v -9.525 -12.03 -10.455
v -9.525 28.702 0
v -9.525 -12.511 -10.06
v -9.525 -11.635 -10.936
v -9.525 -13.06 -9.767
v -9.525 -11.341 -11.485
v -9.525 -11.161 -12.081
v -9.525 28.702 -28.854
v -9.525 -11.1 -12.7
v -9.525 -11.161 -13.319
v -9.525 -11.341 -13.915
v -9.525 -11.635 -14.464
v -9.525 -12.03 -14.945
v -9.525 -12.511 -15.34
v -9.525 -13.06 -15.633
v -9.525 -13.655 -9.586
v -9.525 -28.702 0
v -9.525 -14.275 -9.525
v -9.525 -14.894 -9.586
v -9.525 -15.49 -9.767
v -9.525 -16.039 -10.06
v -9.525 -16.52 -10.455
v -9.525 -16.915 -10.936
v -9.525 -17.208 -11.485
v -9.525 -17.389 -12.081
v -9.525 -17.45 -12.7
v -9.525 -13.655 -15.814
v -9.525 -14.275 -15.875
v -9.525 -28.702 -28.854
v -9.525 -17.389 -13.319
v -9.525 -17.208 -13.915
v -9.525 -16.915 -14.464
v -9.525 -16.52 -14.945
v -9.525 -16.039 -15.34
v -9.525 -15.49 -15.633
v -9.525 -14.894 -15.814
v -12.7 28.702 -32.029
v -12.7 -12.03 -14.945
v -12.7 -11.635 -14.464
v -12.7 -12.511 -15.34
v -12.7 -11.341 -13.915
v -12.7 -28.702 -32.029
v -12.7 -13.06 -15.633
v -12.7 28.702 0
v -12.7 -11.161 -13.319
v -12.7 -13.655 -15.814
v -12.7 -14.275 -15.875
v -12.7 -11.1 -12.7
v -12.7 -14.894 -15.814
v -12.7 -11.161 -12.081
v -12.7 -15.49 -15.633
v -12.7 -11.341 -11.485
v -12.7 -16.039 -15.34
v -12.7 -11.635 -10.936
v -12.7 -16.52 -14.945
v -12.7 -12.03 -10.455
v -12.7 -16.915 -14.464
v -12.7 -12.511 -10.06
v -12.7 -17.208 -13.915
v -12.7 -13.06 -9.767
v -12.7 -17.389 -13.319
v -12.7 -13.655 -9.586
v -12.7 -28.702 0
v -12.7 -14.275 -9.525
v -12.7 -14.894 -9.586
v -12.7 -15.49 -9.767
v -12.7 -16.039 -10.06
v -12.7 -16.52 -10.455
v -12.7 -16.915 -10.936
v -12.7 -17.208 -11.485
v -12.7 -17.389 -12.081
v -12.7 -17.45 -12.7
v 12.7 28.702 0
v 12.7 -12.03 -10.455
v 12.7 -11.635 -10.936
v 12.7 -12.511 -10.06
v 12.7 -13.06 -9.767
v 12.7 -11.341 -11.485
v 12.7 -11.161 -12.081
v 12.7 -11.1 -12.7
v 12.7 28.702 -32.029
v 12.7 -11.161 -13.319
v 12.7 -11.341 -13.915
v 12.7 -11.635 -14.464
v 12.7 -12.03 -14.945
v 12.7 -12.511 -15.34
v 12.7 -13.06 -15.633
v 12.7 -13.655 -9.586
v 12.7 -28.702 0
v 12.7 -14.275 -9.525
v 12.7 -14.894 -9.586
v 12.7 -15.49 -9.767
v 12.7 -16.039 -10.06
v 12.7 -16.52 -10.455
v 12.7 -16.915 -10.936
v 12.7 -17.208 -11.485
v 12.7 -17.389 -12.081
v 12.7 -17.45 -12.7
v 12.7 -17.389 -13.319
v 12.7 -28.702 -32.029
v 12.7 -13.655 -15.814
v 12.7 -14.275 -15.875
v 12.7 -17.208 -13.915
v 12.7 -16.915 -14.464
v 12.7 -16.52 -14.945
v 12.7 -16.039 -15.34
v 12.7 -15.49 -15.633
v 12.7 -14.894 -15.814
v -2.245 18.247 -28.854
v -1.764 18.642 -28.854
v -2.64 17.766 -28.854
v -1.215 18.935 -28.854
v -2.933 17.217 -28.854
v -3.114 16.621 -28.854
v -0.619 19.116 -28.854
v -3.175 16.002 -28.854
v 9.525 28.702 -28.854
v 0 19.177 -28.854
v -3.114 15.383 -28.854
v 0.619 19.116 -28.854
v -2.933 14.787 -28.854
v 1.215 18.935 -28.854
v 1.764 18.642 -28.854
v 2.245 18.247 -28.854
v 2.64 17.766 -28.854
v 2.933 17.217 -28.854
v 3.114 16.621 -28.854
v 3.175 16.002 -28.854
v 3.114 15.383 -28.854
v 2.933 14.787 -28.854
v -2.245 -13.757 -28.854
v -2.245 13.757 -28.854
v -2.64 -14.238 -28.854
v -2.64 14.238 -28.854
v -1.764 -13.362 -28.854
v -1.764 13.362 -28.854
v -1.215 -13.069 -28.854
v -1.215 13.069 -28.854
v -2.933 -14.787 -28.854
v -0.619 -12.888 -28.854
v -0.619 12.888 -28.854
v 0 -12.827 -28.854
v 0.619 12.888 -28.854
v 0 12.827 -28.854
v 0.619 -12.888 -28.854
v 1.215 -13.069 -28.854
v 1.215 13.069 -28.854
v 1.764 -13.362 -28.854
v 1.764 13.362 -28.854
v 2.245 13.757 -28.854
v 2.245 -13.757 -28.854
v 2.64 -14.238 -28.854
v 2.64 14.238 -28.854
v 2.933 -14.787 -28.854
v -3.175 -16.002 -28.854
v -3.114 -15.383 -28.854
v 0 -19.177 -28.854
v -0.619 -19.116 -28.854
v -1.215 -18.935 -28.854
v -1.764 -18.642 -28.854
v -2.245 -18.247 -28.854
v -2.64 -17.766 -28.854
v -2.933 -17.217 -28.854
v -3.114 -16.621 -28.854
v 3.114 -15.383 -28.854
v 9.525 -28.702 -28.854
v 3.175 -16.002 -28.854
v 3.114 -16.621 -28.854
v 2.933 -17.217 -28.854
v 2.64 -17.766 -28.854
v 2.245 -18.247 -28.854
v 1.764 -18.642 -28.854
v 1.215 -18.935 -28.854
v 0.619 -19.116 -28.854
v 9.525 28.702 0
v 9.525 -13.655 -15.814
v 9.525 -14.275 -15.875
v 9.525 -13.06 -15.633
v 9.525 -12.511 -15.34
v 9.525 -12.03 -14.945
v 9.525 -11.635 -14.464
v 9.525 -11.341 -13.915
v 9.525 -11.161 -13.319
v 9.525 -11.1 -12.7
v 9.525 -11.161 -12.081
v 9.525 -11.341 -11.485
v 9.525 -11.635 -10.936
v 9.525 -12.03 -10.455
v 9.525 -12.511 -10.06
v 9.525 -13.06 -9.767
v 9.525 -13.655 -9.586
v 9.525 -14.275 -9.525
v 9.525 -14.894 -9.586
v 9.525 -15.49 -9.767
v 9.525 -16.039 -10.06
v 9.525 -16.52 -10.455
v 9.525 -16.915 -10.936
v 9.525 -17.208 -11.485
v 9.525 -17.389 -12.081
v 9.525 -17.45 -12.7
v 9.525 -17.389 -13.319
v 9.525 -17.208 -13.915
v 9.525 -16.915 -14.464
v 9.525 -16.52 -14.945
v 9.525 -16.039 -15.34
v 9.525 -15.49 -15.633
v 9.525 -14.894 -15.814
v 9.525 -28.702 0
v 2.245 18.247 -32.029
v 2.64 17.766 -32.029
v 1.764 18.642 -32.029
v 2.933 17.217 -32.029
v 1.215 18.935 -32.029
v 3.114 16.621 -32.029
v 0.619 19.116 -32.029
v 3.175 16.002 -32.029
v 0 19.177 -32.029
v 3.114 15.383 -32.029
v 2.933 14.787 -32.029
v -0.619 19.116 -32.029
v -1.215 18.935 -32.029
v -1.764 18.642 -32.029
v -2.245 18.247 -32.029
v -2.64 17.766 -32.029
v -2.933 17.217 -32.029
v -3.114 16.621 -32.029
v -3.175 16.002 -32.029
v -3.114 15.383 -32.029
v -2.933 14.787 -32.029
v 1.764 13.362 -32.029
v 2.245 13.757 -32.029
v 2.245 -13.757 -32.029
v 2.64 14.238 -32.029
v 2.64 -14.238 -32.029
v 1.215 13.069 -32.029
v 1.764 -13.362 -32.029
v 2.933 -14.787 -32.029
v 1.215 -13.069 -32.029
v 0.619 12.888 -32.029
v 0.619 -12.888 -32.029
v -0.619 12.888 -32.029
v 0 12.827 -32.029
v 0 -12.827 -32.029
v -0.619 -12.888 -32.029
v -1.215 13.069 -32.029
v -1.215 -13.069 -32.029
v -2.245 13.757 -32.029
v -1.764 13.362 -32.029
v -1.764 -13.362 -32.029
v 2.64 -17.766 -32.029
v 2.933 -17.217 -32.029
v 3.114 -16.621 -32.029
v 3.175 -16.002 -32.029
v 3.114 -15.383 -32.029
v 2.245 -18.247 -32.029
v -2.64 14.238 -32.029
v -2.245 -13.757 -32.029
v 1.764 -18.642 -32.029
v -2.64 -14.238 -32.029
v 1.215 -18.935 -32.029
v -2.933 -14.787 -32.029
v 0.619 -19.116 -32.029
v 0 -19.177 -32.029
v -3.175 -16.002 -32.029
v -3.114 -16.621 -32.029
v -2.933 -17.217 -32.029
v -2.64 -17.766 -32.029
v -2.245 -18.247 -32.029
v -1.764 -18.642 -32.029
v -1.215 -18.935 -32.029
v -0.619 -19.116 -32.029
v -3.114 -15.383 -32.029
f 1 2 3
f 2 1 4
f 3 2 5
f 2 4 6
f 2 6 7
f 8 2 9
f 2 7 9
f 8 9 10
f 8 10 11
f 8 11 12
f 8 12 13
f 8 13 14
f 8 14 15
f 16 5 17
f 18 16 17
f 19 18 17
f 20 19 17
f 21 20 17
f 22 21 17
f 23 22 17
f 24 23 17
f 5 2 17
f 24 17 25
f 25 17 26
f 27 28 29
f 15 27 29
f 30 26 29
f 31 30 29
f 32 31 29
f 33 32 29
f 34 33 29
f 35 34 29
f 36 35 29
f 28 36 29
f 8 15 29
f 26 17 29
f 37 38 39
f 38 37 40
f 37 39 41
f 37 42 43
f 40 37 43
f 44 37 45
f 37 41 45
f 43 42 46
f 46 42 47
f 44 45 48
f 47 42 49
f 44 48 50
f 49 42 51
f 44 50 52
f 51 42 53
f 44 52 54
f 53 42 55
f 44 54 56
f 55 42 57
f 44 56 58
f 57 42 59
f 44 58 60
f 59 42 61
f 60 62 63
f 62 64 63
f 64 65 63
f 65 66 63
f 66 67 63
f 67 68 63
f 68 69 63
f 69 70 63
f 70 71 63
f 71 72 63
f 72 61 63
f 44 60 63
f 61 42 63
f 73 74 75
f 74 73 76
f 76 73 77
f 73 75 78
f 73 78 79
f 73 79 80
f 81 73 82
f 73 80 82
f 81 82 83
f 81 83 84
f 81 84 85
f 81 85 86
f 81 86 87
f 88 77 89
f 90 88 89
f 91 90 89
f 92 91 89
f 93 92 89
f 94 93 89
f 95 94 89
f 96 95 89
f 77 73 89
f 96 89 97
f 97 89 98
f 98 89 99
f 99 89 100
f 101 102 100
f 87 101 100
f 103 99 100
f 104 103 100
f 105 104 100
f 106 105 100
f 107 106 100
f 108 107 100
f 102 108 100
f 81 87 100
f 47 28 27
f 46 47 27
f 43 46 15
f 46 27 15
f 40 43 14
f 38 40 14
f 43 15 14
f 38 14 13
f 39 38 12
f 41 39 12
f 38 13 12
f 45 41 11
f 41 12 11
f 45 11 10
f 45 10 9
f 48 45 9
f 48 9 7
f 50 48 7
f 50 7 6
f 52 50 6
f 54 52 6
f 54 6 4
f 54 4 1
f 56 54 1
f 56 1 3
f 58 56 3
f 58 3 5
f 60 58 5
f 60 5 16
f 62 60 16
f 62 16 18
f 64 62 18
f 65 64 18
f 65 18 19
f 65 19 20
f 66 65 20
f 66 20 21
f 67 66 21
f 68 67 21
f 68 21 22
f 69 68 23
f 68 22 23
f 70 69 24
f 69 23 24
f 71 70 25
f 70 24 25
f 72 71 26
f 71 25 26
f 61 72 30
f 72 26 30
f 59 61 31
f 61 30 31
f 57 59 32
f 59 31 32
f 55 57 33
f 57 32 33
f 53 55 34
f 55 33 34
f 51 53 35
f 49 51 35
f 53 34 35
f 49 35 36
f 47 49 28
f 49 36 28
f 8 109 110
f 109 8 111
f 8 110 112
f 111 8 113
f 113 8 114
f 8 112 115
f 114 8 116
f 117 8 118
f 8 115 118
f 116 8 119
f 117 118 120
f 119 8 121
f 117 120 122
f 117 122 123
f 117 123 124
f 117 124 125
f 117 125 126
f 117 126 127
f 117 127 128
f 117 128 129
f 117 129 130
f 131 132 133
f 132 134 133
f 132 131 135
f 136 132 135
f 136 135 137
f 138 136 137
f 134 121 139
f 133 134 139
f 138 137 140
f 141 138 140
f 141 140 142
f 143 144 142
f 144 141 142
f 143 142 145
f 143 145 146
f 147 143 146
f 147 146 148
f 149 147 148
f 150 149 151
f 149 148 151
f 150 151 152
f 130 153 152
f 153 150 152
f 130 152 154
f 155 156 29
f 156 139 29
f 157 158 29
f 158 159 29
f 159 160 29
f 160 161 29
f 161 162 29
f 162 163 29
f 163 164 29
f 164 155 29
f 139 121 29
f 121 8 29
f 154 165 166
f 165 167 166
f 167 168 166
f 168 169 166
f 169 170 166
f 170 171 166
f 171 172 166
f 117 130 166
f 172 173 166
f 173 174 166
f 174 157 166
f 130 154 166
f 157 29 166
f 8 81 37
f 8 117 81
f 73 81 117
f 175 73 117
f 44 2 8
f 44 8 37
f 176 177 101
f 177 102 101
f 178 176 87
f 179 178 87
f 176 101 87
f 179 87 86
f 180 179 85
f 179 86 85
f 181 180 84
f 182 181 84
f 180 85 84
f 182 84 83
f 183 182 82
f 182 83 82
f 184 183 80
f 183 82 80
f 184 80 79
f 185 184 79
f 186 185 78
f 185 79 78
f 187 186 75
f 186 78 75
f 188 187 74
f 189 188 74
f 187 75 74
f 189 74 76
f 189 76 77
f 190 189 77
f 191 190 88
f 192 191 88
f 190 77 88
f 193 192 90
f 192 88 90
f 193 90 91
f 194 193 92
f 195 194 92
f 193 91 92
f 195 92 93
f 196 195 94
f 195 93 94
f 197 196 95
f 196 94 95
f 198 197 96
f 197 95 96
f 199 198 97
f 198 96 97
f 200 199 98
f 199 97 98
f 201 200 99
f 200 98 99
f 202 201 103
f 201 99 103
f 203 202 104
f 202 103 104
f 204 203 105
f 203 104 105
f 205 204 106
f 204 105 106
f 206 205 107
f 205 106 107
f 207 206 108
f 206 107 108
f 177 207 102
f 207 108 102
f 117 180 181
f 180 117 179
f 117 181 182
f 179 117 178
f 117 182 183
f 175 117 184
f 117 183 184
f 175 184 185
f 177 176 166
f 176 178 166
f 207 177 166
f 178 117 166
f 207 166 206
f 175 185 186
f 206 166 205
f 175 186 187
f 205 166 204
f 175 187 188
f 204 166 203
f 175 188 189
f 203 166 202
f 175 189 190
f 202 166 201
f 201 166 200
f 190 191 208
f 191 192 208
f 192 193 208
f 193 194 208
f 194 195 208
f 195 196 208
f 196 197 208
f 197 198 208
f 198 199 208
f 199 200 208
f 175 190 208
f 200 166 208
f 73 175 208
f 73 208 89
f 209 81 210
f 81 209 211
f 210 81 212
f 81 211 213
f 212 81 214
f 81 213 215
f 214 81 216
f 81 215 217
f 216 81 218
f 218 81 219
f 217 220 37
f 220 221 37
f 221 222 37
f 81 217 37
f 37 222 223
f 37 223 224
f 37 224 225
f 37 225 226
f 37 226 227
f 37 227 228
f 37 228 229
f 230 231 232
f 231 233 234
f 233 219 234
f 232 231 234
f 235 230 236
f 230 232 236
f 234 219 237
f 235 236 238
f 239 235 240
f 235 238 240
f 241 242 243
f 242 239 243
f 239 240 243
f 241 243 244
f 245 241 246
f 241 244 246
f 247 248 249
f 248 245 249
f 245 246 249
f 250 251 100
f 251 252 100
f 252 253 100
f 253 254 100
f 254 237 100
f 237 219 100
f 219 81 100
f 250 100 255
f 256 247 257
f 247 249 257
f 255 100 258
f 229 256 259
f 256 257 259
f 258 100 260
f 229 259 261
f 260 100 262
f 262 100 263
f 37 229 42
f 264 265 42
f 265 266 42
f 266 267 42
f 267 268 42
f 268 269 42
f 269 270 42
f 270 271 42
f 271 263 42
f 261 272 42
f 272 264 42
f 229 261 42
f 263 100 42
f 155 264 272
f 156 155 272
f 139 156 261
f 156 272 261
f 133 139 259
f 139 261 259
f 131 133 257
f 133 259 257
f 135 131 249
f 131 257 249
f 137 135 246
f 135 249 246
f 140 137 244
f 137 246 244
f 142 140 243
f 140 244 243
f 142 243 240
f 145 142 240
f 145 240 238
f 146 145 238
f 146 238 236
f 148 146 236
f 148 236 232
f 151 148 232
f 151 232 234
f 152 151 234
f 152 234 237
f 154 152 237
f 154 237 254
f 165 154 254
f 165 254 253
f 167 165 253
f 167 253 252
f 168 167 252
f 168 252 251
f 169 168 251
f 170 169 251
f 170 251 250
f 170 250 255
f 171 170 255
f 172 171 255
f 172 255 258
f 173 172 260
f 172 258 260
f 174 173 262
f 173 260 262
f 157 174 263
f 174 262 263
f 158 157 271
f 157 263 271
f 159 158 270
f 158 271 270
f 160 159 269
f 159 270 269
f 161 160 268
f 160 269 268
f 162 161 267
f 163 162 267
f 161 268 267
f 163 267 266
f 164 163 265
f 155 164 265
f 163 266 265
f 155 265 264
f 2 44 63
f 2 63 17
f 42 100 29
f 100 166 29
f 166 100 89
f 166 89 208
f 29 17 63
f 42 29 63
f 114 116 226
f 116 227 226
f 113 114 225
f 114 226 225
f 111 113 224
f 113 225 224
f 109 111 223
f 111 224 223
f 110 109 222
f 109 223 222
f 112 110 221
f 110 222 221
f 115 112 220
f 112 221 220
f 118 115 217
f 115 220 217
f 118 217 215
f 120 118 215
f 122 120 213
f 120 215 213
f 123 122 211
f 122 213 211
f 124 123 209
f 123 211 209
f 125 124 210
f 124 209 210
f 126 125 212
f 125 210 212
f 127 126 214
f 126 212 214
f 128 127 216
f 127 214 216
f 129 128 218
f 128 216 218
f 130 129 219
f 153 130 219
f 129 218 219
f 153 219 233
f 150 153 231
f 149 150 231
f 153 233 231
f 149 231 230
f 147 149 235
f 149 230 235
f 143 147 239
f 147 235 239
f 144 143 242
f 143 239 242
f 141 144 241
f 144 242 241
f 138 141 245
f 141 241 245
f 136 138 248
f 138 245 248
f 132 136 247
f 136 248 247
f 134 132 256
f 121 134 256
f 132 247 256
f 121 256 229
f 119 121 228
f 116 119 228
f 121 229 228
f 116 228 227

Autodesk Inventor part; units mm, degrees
ref_plane "YZ Plane" through (0, 0, 0) normal (1, 0, 0) x (0, 1, 0)
ref_plane "XZ Plane" through (0, 0, 0) normal (0, 1, 0) x (-1, 0, 0)
ref_plane "XY Plane" through (0, 0, 0) normal (0, 0, 1) x (1, 0, 0)
sketch "Sketch1" plane through (0, 0, 0) normal (0, 1, 0) x (-1, 0, 0)
  line L0 (9.525, 0) -> (9.525, -28.8544)
  line L1 (9.525, -28.8544) -> (-9.525, -28.8544)
  line L2 (-9.525, -28.8544) -> (-9.525, 0)
  line L3 (-9.525, 0) -> (-12.7, 0)
  line L4 (-12.7, 0) -> (-12.7, -32.0294)
  line L5 (-12.7, -32.0294) -> (12.7, -32.0294)
  line L6 (12.7, -32.0294) -> (12.7, 0)
  line L7 (12.7, 0) -> (9.525, 0)
  line L8 (0, -38.4353) -> (0, 6.4059) projected
  line L9 (-17.78, 0) -> (17.78, 0) projected
  point P0 (0, 0)
  dimension "d0" = 3.175
  dimension "d1" = 19.05
  dimension "d2" = 28.8544
  dimension "d3" = 3.175
extrude "Extrusion1" add sketch "Sketch1" along normal mid plane 57.404 contours L7 L6 L5 L8 L1 L0 | L8 L5 L4 L3 L2 L1
sketch "Sketch2" plane through (12.7, 28.702, -32.0294) normal (0, 0, -1) x (-1, 0, 0)
  line L0 (25.4, -57.404) -> (25.4, 0) projected
  line L1 (0, 0) -> (25.4, 0) projected
  line L2 (0, -57.404) -> (0, 0) projected
  line L3 (25.4, -57.404) -> (0, -57.404) projected
  line L4 (12.7, -68.8848) -> (12.7, 11.4808) projected
  line L5 (-5.08, -28.702) -> (30.48, -28.702) projected
  circle A0 centre (12.7, -12.7) radius 3.175
  circle A1 centre (12.7, -44.704) radius 3.175
  point P0 (12.7, -28.702)
  dimension "d6" = 6.35
  dimension "d7" = 16.002
extrude "Extrusion2" cut sketch "Sketch2" against normal up to next contours A1 L4 | L4 A1 | A0 L4 | L4 A0
sketch "Sketch3" plane through (12.7, -28.702, -32.0294) normal (1, 0, 0) x (0, 0, -1)
  line L0 (0, 0) -> (0, 57.404) projected
  line L1 (-32.0294, 57.404) -> (0, 57.404) projected
  line L2 (-32.0294, 0) -> (-32.0294, 57.404) projected
  line L3 (0, 0) -> (-32.0294, 0) projected
  circle A0 centre (-19.3294, 14.4272) radius 3.175
  point P0 (-32.0294, 28.702)
  dimension "d10" = 6.35
  dimension "d11" = 12.7
  dimension "d12" = 14.4272
extrude "Extrusion3" cut sketch "Sketch3" against normal up to surface (25.4 mm away) contours A0
properties part number "Actuator Bracket"
